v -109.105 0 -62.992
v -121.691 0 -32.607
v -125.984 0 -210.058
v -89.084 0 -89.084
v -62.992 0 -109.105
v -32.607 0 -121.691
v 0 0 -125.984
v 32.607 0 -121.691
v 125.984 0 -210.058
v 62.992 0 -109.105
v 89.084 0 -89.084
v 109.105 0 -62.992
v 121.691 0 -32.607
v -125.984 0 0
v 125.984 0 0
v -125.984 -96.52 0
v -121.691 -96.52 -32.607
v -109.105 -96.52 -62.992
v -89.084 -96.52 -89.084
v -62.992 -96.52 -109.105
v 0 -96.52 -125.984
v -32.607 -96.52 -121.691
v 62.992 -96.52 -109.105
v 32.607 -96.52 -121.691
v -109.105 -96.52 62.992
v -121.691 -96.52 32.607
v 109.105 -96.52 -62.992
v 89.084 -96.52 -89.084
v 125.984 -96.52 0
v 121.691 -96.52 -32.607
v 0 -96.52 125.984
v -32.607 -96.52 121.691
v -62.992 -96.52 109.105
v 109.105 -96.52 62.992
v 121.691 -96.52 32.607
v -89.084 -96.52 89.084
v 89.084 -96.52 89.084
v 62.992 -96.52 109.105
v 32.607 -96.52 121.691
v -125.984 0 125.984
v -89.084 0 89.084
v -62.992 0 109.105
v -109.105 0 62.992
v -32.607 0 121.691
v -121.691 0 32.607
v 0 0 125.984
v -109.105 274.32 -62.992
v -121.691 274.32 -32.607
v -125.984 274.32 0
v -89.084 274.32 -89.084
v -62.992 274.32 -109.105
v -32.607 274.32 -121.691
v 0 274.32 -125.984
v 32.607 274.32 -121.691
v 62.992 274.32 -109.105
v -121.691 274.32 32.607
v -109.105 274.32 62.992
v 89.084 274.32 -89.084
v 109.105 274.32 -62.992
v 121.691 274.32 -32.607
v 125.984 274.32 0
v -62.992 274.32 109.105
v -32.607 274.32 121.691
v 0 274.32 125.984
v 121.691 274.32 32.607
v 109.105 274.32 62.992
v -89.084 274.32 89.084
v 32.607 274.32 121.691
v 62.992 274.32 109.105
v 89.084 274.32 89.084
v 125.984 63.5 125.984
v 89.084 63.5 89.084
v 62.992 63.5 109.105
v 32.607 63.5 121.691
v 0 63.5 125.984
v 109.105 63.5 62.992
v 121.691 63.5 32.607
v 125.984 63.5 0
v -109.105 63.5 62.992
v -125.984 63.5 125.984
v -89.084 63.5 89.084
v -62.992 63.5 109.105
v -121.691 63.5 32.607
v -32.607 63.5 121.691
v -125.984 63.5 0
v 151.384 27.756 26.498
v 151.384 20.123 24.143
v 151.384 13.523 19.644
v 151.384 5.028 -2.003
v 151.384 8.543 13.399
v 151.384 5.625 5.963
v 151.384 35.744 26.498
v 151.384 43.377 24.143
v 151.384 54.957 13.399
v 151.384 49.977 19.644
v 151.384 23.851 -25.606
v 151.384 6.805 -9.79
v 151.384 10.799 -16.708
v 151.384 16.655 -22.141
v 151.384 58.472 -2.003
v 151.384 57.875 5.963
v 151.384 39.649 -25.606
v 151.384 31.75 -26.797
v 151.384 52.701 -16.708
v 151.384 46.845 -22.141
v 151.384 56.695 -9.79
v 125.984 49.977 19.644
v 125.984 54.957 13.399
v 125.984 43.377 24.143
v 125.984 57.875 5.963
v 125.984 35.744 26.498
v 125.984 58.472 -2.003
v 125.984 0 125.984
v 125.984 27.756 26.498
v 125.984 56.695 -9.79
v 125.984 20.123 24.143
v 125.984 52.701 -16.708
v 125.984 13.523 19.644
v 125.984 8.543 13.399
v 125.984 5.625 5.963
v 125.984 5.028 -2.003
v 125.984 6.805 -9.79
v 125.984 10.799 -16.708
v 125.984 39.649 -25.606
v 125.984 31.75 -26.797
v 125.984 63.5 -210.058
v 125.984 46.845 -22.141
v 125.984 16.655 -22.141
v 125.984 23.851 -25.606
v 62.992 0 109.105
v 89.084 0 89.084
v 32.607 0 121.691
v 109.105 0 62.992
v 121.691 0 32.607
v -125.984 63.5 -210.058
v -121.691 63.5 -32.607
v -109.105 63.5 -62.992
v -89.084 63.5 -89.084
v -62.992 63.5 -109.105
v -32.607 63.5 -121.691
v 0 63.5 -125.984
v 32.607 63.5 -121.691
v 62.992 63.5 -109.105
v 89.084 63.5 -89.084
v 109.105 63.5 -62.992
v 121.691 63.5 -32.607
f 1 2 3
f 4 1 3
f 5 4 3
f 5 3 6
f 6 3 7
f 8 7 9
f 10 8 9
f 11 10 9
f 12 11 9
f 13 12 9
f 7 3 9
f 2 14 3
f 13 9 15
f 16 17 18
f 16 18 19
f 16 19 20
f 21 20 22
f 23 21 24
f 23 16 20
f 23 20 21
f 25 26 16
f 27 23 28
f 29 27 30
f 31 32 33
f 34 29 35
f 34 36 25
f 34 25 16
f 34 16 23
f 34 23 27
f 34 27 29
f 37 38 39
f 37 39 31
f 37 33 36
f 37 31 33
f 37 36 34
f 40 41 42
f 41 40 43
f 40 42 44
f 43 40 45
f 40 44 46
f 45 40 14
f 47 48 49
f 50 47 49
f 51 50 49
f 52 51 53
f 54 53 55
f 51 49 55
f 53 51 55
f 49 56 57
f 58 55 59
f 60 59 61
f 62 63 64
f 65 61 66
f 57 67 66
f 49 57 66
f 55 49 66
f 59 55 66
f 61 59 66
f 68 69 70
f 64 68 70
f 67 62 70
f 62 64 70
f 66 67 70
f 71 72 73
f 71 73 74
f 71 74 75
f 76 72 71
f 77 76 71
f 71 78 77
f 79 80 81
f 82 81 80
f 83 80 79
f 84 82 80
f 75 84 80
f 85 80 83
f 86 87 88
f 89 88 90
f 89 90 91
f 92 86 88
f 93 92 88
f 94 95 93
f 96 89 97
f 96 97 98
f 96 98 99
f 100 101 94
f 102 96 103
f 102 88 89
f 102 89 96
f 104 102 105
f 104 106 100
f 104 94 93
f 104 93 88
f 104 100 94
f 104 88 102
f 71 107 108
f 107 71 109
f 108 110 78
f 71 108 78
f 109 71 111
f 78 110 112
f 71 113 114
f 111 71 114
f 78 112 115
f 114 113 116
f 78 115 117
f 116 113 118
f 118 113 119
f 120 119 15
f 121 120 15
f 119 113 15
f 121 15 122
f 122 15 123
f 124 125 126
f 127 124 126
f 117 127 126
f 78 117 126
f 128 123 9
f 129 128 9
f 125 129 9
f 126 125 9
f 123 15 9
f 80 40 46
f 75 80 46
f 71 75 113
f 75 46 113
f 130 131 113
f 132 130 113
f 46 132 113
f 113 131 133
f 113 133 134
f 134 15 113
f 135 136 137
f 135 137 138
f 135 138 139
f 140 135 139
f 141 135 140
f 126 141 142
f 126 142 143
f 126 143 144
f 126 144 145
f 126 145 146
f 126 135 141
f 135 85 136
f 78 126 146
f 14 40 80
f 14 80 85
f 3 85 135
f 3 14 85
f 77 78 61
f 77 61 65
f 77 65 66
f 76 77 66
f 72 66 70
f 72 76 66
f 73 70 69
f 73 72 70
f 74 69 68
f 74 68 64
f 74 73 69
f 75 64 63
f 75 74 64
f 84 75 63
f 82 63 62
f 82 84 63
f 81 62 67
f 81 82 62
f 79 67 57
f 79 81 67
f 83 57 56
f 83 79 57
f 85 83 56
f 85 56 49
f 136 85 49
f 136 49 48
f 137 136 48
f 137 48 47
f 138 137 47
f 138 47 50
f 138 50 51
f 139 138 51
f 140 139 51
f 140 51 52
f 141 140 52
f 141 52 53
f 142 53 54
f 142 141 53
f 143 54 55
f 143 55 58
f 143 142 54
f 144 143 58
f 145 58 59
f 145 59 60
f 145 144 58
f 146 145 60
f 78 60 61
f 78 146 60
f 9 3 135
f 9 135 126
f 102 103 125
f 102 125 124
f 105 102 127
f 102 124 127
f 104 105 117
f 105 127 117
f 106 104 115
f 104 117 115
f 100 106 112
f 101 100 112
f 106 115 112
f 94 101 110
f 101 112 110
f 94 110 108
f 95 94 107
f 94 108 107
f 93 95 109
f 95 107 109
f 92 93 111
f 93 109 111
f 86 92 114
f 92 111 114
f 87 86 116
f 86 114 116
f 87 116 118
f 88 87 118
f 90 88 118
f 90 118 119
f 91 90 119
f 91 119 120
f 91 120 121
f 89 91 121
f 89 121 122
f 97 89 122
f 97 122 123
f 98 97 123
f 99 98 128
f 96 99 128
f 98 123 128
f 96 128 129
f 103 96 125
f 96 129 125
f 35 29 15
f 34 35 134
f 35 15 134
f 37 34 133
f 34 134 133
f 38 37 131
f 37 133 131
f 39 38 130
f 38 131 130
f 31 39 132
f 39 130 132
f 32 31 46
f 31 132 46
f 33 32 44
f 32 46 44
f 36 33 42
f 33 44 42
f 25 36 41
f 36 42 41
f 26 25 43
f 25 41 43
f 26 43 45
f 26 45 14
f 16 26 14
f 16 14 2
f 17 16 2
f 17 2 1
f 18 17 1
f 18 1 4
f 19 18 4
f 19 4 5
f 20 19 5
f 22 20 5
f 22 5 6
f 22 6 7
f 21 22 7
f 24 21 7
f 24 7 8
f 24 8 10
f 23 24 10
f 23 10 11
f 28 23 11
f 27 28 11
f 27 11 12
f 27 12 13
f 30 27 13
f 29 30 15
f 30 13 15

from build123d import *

# Parameters (mm, degrees)
SKETCH1_W                = 251.968
SKETCH1_H                = 336.042
BOSS_EXTRUDE1_DEPTH      = 63.5
SKETCH2_R                = 125.984
BOSS_EXTRUDE2_DEPTH      = 96.52
BOSS_EXTRUDE2_DEPTH_BACK = 274.32
SKETCH4_R                = 26.797
BOSS_EXTRUDE7_DEPTH      = 25.4


with BuildPart() as part:
    # Sketch1 → Boss-Extrude1 (new body)
    with BuildSketch(Plane(origin=(0, 0, 0), x_dir=(1, 0, 0), z_dir=(0, 1, 0))):
        with Locations((0, 42.037)):
            Rectangle(SKETCH1_W, SKETCH1_H)
    extrude(amount=BOSS_EXTRUDE1_DEPTH)

    # Sketch2 → Boss-Extrude2 (add, two sides)
    with BuildSketch(Plane.XZ) as boss_extrude2_sk:
        Circle(SKETCH2_R)
    extrude(amount=BOSS_EXTRUDE2_DEPTH)
    extrude(boss_extrude2_sk.sketch, amount=-BOSS_EXTRUDE2_DEPTH_BACK)

    # Sketch4 → Boss-Extrude7 (add)
    with BuildSketch(Plane(origin=(125.984, 0, 0), x_dir=(0, 0, -1), z_dir=(1, 0, 0))):
        with Locations((0, 31.75)):
            Circle(SKETCH4_R)
    extrude(amount=BOSS_EXTRUDE7_DEPTH)


solid = part.part
